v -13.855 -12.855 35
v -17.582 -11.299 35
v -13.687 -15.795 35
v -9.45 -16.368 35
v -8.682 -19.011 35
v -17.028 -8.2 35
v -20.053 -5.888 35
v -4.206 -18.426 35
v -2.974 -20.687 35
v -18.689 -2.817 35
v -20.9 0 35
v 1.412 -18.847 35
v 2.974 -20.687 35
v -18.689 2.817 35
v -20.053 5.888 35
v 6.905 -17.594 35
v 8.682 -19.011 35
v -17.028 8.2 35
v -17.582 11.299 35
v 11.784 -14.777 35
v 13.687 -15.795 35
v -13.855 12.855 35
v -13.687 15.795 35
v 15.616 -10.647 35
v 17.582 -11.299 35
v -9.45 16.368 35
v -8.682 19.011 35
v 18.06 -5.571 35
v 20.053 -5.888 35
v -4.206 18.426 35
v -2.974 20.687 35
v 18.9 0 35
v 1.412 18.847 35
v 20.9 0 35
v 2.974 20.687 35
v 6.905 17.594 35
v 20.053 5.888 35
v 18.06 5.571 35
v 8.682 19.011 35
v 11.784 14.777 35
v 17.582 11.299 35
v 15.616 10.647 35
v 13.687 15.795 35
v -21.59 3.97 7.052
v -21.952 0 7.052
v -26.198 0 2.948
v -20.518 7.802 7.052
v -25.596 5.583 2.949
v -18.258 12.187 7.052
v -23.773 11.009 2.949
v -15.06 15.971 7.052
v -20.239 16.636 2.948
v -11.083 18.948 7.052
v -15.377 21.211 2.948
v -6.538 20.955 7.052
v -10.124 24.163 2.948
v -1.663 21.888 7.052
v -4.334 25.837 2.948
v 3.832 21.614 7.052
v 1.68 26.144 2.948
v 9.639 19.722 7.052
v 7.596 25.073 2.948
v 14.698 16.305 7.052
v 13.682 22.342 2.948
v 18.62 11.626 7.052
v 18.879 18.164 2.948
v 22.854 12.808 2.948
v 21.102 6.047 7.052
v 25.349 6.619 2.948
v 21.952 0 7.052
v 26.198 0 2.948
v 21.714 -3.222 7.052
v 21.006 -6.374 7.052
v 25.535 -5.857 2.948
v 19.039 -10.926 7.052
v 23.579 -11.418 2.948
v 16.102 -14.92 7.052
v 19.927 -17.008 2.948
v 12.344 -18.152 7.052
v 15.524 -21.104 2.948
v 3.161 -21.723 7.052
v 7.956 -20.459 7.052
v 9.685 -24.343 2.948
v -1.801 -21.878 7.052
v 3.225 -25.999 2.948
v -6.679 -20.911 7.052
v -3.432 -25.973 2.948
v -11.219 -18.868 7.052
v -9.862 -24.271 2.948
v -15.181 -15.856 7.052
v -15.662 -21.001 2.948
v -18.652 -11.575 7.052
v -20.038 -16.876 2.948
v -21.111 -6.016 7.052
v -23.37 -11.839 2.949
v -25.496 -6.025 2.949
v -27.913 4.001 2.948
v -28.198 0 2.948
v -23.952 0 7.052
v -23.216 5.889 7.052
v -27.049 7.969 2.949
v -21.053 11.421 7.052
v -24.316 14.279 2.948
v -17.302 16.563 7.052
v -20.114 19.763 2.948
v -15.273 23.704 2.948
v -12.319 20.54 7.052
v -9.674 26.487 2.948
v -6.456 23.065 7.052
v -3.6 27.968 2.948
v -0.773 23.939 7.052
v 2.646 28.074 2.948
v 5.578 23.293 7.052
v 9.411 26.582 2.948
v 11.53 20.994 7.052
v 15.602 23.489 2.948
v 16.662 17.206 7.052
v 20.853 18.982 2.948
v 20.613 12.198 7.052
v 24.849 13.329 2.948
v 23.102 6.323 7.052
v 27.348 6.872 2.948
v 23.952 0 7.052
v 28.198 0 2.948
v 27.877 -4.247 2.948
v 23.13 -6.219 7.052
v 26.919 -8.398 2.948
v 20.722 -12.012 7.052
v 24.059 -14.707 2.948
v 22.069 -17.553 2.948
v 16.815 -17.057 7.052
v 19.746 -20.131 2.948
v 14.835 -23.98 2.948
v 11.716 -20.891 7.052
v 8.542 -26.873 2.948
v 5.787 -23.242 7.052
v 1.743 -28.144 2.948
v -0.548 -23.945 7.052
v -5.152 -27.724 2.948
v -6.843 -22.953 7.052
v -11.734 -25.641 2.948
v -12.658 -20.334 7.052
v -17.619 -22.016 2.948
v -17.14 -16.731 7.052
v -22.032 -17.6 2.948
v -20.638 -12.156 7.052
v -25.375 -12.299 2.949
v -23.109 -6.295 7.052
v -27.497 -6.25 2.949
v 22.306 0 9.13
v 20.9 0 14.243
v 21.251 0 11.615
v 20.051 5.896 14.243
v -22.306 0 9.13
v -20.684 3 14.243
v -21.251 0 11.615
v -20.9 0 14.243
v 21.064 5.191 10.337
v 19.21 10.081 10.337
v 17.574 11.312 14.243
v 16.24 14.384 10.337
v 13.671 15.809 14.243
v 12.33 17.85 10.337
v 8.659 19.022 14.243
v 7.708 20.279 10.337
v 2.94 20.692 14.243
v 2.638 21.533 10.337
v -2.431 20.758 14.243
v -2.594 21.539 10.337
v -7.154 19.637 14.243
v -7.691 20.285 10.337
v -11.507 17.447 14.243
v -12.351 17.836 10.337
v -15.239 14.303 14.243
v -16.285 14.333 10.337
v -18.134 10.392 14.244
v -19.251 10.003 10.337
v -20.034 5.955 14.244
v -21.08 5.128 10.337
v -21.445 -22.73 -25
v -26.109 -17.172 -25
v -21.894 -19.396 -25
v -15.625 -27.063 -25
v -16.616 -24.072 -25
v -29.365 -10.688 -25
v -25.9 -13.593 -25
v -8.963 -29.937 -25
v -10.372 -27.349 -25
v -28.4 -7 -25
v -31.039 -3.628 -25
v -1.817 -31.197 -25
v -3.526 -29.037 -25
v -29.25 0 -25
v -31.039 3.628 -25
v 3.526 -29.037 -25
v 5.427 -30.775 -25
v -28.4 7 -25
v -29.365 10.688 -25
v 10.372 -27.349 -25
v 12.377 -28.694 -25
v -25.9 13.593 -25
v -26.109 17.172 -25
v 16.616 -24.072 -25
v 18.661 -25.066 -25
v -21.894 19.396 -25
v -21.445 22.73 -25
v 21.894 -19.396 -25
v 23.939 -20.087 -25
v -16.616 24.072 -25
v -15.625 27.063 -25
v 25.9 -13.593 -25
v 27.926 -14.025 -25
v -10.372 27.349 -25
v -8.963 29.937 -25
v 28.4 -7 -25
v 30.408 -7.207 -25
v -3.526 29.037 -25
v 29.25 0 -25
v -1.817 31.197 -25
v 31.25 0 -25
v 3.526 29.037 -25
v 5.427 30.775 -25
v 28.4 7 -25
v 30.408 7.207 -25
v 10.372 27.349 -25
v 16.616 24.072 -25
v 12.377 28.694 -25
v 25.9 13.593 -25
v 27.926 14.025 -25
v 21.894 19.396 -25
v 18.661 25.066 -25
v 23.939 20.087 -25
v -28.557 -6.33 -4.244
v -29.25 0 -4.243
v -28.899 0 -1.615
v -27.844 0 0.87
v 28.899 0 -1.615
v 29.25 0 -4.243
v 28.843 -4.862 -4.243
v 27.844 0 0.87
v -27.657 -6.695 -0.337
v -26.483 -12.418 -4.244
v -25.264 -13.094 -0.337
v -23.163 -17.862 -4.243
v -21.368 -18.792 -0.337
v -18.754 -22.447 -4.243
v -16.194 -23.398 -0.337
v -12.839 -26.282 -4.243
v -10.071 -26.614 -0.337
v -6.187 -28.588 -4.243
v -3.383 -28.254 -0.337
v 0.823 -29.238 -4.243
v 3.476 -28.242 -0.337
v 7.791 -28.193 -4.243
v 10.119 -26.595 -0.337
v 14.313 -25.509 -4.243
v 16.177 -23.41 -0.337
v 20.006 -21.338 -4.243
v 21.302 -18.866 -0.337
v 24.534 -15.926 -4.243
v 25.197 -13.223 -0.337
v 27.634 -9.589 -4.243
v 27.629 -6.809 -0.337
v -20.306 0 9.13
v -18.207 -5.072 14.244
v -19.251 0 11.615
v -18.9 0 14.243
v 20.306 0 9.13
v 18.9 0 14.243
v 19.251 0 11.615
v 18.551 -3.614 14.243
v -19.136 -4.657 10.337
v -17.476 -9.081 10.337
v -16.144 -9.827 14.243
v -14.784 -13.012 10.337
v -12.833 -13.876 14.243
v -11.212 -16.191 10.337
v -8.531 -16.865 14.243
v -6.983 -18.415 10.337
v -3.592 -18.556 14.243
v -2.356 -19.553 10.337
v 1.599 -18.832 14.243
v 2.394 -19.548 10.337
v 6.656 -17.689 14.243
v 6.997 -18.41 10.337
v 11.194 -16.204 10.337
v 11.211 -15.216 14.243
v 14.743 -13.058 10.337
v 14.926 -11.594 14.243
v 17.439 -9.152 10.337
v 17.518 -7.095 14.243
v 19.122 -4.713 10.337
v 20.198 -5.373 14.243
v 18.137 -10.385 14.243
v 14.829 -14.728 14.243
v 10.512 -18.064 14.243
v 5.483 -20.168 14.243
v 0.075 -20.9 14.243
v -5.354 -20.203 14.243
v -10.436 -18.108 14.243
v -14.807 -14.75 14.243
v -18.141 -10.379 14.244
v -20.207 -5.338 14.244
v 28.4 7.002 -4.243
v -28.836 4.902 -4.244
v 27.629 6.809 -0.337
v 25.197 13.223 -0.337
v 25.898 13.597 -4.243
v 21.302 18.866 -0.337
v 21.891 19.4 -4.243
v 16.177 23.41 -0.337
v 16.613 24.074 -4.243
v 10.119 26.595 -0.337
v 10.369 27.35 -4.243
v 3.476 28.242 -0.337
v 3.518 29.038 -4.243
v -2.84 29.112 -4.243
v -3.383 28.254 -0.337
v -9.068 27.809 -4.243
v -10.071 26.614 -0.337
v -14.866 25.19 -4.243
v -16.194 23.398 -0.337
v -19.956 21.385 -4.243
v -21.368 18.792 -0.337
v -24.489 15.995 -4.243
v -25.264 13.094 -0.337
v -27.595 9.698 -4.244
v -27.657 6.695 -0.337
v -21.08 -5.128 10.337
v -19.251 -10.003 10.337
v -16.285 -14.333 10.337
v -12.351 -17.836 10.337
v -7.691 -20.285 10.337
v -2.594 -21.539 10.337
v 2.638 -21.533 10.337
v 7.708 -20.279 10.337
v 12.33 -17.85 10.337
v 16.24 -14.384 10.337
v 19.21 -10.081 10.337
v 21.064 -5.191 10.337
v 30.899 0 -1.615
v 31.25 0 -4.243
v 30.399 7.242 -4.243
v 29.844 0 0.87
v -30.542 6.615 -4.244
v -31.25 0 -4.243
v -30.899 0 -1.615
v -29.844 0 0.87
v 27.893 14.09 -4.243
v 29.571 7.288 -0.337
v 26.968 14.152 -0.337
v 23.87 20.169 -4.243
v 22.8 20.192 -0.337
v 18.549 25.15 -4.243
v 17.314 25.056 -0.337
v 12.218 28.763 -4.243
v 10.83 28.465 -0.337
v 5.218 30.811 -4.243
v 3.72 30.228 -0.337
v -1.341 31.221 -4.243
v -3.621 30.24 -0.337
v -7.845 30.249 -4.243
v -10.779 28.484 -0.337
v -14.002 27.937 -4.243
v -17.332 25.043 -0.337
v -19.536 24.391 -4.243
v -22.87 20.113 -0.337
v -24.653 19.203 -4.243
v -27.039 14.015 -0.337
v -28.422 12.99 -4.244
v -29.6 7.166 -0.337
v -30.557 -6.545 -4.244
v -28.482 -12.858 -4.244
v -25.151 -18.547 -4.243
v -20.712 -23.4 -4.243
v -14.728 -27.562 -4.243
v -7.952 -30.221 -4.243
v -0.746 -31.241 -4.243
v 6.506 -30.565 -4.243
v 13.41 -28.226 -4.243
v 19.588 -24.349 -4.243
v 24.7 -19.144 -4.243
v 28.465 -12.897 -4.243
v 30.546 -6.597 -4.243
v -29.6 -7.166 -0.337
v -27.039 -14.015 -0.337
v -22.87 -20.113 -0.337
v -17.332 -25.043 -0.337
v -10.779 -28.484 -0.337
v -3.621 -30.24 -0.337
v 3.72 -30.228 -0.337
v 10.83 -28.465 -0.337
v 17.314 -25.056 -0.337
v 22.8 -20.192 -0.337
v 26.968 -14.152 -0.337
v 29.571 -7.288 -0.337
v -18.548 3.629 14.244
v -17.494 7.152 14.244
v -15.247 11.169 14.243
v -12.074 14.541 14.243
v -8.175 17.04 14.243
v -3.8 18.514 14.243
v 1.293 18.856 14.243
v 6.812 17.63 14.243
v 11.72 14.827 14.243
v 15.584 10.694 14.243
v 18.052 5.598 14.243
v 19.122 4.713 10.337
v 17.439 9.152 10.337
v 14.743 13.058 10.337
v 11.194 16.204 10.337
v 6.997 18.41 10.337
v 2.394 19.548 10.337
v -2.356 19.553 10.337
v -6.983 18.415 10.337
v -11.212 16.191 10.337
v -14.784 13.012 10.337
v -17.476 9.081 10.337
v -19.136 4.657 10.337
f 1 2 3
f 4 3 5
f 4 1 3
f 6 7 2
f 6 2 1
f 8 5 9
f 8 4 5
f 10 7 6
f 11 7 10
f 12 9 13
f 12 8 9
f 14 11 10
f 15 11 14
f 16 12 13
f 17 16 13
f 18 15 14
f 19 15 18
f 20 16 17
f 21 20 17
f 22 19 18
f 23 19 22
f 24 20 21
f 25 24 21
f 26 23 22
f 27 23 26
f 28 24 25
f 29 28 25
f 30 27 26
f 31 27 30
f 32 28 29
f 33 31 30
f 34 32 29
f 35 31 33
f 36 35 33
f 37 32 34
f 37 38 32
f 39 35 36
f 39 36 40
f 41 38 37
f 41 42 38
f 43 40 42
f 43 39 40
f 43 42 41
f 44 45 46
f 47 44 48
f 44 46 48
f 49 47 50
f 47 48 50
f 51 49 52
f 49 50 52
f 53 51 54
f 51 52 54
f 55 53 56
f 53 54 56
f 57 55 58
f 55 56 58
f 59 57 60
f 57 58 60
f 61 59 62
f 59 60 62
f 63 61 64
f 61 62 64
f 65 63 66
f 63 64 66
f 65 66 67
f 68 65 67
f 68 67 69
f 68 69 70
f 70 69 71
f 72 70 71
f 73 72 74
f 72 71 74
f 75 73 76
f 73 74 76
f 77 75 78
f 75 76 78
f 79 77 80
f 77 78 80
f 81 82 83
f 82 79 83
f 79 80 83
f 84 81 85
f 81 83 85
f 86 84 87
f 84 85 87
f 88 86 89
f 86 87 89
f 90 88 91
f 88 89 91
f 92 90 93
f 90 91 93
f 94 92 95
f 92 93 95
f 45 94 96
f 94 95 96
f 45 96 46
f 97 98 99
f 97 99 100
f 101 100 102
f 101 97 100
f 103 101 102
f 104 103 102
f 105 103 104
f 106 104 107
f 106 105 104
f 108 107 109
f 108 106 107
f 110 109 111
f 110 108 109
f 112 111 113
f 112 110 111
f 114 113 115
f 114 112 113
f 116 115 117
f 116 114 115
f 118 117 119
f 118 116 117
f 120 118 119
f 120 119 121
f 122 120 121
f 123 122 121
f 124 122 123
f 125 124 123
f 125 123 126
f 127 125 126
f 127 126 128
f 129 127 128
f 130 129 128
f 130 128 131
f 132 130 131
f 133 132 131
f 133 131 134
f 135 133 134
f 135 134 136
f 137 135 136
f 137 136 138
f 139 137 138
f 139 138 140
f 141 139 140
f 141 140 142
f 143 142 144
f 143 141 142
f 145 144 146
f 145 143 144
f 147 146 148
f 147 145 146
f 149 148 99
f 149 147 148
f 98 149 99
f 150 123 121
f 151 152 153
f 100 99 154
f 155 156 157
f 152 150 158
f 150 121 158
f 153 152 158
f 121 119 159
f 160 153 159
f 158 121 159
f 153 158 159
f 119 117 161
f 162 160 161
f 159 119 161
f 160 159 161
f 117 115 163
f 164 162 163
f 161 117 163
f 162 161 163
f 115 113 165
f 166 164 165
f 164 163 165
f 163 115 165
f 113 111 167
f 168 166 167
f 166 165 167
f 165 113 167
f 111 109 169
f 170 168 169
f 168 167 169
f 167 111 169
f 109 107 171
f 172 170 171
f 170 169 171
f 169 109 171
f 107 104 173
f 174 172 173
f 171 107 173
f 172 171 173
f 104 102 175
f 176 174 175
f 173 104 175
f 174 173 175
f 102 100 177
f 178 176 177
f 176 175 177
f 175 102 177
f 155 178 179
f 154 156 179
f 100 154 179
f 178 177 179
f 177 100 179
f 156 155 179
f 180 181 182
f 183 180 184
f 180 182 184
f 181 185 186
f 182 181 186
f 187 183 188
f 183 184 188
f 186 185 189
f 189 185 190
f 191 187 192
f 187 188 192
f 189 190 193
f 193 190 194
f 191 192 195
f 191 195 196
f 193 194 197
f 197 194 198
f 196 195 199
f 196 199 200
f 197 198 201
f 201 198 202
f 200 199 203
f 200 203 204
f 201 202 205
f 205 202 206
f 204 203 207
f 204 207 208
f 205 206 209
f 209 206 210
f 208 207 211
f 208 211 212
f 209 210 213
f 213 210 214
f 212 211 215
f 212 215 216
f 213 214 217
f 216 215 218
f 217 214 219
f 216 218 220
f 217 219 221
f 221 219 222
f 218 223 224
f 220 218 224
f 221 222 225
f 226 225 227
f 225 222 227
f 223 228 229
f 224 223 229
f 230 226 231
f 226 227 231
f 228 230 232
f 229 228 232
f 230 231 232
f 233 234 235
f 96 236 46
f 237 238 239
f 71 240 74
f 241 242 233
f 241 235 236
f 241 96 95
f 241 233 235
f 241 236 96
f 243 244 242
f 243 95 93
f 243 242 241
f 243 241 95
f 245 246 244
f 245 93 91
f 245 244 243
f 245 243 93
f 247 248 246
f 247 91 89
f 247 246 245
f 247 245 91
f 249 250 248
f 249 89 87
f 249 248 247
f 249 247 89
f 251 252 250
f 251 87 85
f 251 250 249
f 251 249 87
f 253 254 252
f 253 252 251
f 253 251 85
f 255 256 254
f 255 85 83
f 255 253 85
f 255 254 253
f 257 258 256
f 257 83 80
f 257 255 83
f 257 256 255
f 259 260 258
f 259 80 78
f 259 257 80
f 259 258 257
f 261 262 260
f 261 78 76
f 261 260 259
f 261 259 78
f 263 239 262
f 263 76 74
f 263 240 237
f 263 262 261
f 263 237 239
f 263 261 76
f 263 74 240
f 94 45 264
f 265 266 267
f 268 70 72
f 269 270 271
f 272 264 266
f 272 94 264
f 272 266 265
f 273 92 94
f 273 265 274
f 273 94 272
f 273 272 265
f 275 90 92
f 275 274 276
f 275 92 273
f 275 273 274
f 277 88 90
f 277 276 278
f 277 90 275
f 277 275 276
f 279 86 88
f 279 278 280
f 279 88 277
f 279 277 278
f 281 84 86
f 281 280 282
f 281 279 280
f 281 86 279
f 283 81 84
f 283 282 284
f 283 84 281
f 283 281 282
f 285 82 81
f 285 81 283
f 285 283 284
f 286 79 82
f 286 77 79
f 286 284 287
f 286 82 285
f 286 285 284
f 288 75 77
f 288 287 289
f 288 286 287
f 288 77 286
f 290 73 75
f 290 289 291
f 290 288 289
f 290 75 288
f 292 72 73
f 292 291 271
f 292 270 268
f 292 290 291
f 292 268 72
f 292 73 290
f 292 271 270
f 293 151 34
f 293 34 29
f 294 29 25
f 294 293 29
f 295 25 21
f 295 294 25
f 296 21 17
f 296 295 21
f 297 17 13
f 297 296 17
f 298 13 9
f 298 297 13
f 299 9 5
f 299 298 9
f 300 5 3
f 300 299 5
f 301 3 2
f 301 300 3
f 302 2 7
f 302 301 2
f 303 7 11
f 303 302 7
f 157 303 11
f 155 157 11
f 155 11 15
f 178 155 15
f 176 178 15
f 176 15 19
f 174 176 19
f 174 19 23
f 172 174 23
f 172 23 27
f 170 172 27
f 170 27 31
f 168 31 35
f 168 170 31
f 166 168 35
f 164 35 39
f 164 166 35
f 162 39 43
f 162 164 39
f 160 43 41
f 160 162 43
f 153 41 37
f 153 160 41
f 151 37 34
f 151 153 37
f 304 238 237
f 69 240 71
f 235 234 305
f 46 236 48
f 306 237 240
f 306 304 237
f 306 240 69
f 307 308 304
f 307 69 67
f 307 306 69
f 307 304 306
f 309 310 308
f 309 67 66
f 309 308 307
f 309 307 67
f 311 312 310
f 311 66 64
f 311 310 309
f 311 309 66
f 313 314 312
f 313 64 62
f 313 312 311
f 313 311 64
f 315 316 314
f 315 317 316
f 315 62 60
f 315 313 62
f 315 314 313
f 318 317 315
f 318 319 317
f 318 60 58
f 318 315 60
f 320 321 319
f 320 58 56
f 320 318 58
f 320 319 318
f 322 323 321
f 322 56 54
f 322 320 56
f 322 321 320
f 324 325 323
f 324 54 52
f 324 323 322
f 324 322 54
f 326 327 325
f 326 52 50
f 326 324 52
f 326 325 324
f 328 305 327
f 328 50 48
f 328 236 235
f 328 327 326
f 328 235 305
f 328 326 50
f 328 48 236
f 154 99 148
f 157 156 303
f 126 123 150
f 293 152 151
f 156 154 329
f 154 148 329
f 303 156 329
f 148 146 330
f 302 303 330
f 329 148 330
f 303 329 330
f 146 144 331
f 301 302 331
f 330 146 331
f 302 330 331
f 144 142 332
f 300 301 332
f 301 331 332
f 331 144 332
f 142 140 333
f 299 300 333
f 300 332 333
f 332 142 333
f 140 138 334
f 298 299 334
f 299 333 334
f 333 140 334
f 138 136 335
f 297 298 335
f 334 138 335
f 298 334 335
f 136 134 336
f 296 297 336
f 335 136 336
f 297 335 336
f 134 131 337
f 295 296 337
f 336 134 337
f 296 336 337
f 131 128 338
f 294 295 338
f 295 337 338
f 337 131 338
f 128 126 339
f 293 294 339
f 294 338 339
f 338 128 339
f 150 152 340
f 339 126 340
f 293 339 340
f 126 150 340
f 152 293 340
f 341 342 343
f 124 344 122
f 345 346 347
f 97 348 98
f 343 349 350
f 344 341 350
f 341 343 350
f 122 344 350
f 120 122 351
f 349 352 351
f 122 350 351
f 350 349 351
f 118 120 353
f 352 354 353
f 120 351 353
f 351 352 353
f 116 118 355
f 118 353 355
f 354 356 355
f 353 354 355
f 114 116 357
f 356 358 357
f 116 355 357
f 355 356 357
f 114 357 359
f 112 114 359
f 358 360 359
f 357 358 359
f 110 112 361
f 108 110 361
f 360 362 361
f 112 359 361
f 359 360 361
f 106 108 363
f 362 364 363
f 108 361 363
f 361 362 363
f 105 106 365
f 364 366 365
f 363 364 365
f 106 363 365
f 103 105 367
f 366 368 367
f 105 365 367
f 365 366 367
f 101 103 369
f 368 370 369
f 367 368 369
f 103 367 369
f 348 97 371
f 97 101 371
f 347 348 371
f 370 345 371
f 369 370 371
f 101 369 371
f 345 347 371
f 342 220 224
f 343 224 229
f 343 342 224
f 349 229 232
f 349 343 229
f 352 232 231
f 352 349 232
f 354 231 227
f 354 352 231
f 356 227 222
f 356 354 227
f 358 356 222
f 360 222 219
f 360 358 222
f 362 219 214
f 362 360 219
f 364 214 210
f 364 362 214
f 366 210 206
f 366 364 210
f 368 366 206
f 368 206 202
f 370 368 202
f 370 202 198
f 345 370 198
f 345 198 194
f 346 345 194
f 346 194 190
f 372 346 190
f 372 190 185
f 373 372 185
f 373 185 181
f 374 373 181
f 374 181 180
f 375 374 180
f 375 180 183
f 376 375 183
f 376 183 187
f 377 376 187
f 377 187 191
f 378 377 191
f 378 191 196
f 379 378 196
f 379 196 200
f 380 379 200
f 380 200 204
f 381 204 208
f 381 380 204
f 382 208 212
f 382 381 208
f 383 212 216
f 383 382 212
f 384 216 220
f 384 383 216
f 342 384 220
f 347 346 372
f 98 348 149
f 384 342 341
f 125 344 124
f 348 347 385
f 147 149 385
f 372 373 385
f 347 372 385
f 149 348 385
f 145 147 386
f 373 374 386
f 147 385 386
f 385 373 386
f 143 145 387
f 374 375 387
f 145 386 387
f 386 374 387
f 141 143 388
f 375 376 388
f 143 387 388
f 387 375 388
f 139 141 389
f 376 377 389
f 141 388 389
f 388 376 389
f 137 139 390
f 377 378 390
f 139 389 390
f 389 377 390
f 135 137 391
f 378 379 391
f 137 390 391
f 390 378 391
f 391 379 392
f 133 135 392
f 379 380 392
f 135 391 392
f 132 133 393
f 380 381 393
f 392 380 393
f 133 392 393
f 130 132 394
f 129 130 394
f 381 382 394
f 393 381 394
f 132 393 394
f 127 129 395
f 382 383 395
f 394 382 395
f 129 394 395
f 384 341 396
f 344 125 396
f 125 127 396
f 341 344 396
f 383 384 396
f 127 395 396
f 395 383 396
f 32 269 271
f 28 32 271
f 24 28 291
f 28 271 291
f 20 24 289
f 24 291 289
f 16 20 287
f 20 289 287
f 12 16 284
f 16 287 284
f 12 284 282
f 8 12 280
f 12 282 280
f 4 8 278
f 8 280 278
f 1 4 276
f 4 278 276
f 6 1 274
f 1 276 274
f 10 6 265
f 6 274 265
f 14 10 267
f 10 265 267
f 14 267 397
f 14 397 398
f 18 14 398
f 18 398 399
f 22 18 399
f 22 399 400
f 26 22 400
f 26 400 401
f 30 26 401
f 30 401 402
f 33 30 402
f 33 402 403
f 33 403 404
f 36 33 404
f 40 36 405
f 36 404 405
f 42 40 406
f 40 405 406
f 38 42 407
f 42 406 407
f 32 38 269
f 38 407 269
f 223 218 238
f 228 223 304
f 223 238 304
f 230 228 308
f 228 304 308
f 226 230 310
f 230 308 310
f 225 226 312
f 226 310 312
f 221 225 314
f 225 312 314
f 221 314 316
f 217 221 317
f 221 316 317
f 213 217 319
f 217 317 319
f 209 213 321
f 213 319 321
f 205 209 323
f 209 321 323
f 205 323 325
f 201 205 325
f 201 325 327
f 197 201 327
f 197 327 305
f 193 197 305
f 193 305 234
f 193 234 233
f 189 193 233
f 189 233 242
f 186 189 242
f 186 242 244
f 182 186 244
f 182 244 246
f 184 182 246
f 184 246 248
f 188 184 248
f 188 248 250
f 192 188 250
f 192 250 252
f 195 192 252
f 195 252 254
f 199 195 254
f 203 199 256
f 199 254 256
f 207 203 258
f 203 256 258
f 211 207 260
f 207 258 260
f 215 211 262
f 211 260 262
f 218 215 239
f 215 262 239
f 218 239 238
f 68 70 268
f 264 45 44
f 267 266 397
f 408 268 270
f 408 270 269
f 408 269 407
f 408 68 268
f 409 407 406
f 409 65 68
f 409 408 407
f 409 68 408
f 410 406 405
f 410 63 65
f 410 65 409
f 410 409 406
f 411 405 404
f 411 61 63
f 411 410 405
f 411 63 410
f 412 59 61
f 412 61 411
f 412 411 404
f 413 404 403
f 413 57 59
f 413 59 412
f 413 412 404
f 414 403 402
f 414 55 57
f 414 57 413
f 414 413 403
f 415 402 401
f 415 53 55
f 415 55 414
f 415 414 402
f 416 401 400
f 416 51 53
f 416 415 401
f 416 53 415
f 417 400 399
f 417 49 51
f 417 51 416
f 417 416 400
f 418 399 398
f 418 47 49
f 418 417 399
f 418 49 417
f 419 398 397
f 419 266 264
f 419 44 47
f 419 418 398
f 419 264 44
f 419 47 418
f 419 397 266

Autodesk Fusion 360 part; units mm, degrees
sketch "Sketch1" plane through (0, 0, 0) normal (0, 0, 1) x (1, 0, 0)
  circle A0 centre (0, 0) radius 29.25
  circle A1 centre (0, 0) radius 31.25
  dimension "d1" = 58.5
  dimension "d2" = 2
ref_plane "WorkPlane1" through (0, 0, 10) normal (0, 0, 1) x (1, 0, 0)
sketch "Sketch2" plane through (0, 0, 10) normal (0, 0, 1) x (1, 0, 0)
  circle A0 centre (0, 0) radius 18.9
  circle A1 centre (0, 0) radius 20.9
  dimension "d4" = 37.8
  dimension "d5" = 2
sketch "Sketch3" plane through (0, 0, 0) normal (0, 1, 0) x (1, 0, 0)
  line L0 (-29.25, 0) -> (29.25, 0)
  line L1 (-31.25, 0) -> (31.25, 0)
  line L2 (-18.9, -10) -> (18.9, -10)
  line L3 (-20.9, -10) -> (20.9, -10)
  line L4 (-31.25, 0) -> (-20.9, -10)
  line L5 (-18.9, -10) -> (-29.25, 0)
  line L6 (0, 0) -> (0, -30) construction
revolve "Revolve1" add sketch "Sketch3" angle 360 about axis through (0, 0, 0) along (0, 0, 1)
extrude "Extrude1" add sketch "Sketch2" along normal blind 25
extrude "Extrude2" add sketch "Sketch1" against normal blind 25
fillet "Fillet1" radius 10 1 edges at (-27.2706, 10.5773, 0)
fillet "Fillet2" radius 10 2 edges at (-17.621, 6.8345, 10) (-19.4856, 7.5578, 10)
fillet "Fillet3" radius 10 1 edges at (-29.1352, 11.3005, 0)
